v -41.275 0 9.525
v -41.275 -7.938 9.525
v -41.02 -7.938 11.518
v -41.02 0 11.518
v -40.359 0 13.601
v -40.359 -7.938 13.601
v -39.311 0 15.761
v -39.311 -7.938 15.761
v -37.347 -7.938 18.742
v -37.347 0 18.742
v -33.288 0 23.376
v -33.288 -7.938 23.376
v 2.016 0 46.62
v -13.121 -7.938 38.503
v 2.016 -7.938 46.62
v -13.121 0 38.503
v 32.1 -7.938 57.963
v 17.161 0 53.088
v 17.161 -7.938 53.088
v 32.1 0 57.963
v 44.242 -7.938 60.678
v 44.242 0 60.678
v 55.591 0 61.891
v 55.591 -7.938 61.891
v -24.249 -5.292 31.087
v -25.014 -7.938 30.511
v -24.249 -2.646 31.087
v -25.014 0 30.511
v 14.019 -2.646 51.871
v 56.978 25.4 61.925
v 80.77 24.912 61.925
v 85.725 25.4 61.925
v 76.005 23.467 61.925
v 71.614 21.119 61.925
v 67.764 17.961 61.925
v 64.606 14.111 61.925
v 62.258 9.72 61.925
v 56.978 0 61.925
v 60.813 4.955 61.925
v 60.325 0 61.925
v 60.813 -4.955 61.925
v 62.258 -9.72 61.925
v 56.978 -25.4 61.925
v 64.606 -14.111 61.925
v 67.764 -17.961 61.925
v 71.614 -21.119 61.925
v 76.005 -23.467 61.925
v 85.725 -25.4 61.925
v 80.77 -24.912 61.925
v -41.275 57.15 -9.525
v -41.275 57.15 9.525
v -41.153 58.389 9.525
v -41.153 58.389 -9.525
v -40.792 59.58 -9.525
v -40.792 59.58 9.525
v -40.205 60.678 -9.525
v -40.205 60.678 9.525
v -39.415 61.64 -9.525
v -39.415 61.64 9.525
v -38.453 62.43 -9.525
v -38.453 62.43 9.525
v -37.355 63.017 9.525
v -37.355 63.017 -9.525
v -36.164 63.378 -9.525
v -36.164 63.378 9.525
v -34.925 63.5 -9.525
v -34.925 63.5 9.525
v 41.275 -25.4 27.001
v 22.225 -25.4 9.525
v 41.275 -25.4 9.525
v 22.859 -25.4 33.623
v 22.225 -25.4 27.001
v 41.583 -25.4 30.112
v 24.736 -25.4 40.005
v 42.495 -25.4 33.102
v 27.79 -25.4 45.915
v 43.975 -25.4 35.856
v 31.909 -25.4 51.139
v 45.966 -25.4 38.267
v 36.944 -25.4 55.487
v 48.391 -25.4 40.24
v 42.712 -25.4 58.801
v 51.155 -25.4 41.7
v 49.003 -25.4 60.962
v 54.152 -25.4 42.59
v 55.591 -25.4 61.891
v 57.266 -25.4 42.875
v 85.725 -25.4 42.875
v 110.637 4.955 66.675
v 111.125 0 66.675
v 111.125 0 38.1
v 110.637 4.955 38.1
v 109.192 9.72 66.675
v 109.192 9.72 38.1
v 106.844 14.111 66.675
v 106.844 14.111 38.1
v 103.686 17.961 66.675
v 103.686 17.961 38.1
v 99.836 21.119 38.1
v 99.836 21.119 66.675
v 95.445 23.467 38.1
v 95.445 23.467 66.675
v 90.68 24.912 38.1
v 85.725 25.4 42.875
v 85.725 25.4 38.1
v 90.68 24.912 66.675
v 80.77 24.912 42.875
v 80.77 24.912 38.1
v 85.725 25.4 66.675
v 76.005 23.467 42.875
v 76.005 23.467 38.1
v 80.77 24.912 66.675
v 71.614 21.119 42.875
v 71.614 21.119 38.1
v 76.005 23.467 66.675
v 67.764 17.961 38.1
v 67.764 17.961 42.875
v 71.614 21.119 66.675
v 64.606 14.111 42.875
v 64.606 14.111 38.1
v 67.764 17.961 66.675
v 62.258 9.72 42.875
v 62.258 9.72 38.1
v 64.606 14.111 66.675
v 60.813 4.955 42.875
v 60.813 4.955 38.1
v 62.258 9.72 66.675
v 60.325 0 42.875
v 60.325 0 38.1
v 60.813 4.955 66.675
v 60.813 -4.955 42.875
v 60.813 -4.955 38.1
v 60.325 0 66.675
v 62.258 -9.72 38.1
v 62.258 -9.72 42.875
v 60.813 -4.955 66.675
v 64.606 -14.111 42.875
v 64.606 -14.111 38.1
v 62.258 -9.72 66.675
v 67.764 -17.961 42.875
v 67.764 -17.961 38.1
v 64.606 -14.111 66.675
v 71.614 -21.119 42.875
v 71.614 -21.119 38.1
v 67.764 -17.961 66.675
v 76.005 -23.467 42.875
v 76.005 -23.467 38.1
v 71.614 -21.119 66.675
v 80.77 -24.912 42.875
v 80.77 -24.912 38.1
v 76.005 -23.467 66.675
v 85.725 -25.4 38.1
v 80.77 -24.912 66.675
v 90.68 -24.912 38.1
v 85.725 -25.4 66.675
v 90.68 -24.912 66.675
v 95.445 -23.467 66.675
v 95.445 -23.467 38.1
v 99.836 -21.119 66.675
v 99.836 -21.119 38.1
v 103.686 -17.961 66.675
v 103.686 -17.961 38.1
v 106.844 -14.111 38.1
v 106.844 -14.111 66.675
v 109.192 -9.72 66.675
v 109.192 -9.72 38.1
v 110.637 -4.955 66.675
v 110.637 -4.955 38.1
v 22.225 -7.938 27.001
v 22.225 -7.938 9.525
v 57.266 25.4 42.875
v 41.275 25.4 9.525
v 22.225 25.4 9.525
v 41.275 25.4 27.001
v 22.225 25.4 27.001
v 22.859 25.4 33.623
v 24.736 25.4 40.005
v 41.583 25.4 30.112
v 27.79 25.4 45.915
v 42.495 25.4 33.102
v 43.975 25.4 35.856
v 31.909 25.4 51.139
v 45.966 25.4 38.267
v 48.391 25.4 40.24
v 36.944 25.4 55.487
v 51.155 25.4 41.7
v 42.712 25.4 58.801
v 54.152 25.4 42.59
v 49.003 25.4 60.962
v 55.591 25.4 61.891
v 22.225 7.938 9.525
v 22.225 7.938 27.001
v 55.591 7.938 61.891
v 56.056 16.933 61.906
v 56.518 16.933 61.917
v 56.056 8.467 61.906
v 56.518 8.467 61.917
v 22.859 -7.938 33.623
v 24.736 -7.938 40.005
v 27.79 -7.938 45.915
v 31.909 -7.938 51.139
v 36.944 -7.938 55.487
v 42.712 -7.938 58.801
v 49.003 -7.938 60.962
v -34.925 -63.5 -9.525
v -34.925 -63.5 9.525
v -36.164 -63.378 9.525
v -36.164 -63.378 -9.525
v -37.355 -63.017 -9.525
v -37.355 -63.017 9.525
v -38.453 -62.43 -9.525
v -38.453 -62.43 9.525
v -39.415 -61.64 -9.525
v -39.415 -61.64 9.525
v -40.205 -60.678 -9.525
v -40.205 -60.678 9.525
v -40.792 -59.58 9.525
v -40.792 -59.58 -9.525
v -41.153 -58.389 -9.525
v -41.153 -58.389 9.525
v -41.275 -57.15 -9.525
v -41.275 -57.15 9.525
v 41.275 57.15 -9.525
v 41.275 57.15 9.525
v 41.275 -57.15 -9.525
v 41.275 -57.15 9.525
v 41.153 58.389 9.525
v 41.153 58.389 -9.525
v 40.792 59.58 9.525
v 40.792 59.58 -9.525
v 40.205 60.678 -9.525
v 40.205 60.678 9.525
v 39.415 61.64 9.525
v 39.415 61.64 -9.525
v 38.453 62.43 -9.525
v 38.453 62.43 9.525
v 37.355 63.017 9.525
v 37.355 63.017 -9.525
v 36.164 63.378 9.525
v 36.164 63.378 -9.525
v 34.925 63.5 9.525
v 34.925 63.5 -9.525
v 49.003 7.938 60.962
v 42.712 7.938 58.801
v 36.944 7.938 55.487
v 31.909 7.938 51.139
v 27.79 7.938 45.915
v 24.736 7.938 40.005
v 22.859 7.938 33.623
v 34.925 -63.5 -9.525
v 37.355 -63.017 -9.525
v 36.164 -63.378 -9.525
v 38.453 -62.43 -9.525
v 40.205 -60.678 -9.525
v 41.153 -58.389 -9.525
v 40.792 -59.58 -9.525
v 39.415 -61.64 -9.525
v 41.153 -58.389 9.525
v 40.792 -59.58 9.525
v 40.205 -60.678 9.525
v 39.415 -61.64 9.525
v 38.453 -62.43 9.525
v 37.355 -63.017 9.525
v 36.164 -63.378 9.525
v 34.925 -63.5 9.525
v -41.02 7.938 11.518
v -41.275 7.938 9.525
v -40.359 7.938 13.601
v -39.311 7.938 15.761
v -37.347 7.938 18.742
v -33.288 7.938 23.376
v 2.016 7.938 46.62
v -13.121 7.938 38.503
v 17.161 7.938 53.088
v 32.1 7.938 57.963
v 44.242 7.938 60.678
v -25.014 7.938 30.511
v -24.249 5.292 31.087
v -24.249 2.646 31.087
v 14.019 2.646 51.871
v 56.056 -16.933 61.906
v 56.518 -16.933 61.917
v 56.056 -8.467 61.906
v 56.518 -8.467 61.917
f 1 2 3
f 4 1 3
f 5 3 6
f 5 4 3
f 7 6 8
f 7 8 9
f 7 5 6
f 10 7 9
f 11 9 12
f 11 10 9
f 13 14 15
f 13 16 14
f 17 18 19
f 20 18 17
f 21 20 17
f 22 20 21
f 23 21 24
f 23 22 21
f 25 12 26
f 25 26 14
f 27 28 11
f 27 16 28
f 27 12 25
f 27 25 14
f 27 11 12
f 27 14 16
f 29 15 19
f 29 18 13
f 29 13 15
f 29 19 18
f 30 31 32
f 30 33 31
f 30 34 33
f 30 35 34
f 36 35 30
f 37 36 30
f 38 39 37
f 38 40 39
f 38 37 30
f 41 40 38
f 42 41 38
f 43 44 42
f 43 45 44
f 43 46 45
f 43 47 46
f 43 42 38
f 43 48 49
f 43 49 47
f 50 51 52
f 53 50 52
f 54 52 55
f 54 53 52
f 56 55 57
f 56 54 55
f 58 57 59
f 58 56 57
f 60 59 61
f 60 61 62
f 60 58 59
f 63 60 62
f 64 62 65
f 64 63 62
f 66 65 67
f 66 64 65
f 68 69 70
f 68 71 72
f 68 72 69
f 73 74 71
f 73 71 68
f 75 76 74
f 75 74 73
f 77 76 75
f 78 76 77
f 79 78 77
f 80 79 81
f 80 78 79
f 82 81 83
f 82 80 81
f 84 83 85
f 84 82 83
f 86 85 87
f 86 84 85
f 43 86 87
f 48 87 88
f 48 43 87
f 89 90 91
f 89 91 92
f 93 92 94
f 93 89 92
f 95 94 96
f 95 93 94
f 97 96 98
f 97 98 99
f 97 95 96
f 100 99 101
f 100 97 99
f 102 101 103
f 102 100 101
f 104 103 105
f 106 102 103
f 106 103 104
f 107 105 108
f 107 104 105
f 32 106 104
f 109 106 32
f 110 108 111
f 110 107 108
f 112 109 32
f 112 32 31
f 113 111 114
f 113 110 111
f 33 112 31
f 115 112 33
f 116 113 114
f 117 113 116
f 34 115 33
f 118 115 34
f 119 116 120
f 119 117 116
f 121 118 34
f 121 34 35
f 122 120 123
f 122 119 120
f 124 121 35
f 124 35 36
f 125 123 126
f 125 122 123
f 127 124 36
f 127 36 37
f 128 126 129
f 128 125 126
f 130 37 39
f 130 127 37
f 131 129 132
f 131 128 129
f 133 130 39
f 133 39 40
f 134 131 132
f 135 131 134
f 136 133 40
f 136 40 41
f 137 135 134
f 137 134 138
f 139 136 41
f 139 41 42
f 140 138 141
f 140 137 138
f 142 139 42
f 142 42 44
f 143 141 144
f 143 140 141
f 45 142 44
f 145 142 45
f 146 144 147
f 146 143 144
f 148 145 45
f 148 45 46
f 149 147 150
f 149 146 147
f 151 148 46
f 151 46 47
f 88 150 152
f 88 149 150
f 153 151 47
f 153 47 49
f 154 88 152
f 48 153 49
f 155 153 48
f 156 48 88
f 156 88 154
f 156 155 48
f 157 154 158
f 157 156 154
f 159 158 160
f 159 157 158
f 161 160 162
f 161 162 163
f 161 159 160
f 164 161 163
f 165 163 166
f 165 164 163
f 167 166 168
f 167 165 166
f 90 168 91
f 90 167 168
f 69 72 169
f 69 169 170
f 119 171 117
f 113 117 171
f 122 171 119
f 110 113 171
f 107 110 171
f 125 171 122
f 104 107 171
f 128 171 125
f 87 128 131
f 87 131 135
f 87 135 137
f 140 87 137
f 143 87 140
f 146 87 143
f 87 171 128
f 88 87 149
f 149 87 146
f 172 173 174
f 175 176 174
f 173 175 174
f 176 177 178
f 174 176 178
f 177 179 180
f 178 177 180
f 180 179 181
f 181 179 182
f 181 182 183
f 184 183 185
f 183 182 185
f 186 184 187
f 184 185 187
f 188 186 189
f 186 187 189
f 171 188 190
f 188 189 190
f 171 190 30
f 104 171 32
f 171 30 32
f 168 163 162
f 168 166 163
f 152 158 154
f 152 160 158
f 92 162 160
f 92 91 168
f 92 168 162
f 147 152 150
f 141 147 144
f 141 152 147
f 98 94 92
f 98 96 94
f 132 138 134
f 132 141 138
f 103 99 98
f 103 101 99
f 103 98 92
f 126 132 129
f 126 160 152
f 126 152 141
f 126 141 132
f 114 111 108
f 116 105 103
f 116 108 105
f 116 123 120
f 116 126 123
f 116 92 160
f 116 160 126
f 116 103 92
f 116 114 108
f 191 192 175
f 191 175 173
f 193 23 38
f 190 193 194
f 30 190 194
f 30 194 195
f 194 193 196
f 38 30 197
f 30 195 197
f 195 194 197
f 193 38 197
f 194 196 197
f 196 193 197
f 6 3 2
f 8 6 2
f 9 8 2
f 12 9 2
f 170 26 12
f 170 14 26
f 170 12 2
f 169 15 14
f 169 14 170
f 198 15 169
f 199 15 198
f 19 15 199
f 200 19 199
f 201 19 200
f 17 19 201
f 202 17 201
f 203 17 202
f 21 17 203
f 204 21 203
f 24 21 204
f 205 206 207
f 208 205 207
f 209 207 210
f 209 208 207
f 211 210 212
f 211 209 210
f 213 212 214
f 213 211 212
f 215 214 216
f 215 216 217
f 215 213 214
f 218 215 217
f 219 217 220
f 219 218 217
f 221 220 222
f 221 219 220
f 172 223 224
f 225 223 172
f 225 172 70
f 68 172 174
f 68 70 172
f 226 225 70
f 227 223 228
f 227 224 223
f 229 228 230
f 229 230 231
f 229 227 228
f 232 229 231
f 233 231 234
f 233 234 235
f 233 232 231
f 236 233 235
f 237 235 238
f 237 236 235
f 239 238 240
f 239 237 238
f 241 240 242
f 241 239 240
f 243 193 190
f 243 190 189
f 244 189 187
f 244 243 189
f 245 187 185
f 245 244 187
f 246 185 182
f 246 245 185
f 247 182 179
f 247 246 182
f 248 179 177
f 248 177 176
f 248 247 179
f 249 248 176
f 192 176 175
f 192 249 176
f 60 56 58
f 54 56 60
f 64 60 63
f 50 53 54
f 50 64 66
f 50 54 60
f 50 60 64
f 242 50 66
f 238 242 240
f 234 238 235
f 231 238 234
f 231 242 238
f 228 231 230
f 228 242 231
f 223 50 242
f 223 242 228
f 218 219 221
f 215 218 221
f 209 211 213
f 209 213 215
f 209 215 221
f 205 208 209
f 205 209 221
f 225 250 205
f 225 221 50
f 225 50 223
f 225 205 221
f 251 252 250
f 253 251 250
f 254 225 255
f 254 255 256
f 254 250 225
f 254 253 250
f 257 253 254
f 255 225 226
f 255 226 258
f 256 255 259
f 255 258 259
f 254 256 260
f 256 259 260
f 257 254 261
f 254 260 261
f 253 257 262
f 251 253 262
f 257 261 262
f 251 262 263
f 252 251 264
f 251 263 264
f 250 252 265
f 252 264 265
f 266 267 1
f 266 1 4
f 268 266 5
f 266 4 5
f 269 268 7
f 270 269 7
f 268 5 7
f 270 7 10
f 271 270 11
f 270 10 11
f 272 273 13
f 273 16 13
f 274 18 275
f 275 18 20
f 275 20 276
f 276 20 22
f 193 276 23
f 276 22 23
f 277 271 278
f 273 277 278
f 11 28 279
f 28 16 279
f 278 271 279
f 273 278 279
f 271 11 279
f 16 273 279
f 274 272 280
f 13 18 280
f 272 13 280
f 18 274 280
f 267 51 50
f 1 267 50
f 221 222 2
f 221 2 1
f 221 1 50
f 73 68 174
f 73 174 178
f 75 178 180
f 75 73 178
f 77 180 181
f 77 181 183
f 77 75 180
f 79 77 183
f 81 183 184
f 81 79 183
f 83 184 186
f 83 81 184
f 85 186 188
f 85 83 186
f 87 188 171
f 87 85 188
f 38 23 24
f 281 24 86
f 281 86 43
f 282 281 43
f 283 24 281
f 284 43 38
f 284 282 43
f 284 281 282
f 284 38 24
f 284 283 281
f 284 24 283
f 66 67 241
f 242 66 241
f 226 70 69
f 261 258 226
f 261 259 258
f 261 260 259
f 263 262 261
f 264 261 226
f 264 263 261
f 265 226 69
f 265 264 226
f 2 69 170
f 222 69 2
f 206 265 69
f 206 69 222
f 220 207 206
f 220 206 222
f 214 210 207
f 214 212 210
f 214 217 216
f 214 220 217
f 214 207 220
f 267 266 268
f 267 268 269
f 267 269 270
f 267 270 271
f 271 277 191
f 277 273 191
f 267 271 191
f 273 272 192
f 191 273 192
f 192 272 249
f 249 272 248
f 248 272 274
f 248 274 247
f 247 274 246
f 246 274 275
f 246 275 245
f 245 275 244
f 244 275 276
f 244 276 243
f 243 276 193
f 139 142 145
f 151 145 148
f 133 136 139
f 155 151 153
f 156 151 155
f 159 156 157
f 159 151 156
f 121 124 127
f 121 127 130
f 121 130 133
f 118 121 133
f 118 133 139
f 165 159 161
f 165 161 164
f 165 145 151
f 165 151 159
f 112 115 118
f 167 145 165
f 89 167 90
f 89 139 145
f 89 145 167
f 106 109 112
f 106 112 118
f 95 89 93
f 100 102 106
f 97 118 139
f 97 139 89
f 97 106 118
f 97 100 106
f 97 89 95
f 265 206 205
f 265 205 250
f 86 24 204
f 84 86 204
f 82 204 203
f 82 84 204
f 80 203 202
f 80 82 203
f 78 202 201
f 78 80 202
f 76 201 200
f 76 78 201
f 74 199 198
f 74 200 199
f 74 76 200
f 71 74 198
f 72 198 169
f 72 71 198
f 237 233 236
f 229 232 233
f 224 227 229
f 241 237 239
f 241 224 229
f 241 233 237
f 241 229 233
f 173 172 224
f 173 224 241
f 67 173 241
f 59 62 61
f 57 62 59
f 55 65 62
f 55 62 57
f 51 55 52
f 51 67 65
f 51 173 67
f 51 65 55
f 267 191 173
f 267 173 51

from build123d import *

# Parameters (mm, degrees)
F1_DEPTH = 63.5
F0_W     = 25.4
F0_H     = 19.05
F2_DEPTH = 25.4
F3_DEPTH = 7.9375
F5_R     = 6.35


# Not quite as in the source:
# - a feature names something its author has since deleted; it is built from what else it names


with BuildPart() as f1:
    # F0 (on Front) → F1 (new body, symmetric)
    with BuildSketch(Plane.XZ):
        Polygon((41.275, -9.525), (41.275, 9.525), (22.225, 9.525), (-41.275, 9.525), (-41.275, -9.525), align=None)
    extrude(amount=F1_DEPTH, both=True)

    # F0 (on Front) → F2 (join, symmetric)
    with BuildSketch(Plane.XZ):
        with BuildLine():
            Line((22.225, 9.525), (41.275, 9.525))
            Line((41.275, 9.525), (41.275, 27.0006215875))
            ThreePointArc((41.275, 27.0006215875), (45.9656588405, 38.2667716764), (57.2656945294, 42.8752))
            Line((57.2656945294, 42.8752), (60.325, 42.8752))
            Line((60.325, 42.8752), (60.325, 61.9252))
            Line((60.325, 61.9252), (56.9783966597, 61.9252))
            add(Edge.make_bspline(
                [(55.5906283852, 61.8907919104), (56.0567092962, 61.9071657032), (56.5193514661, 61.918664428), (56.9783966597, 61.9252)],
                knots=[109.9767617242, 109.9767617242, 109.9767617242, 109.9767617242, 111.3530911794, 111.3530911794, 111.3530911794, 111.3530911794], degree=3))
            ThreePointArc((55.5906283852, 61.8907919104), (31.9089948829, 51.1387094503), (22.225, 27.0006215875))
            Line((22.225, 27.0006215875), (22.225, 9.525))
        make_face()
        with Locations((73.025, 52.4002)):
            Rectangle(F0_W, F0_H)
    extrude(amount=F2_DEPTH, both=True)

    # F0 (on Front) → F3 (join, symmetric)
    with BuildSketch(Plane.XZ):
        with BuildLine():
            Line((-41.275, 9.525), (22.225, 9.525))
            Line((22.225, 9.525), (22.225, 27.0006215875))
            ThreePointArc((22.225, 27.0006215875), (31.9089948829, 51.1387094503), (55.5906283852, 61.8907919104))
            add(Edge.make_bspline(
                [(-41.275, 9.525), (-40.8507124628, 28.1470359497), (18.3480415197, 60.5824302397), (55.5906283852, 61.8907919104)],
                knots=[0, 0, 0, 0, 109.9767617242, 109.9767617242, 109.9767617242, 109.9767617242], degree=3))
        make_face()
    extrude(amount=F3_DEPTH, both=True)

    # F0 (on Front) → F4 (revolve)
    with BuildSketch(Plane.XZ):
        Polygon((85.725, 61.9252), (85.725, 42.8752), (85.725, 38.1), (111.125, 38.1), (111.125, 66.675), (85.725, 66.675), align=None)
    revolve(axis=Axis((85.725, 0, 52.3875), (0, 0, 1)))

    # F5
    f5_edges = [f1.edges().sort_by_distance(p)[0] for p in [
        (-41.275, -63.5, 0),
        (41.275, -63.5, 0),
        (41.275, 63.5, 0),
        (-41.275, 63.5, 0),
    ]]
    fillet(f5_edges, radius=F5_R)


solid = f1.part
